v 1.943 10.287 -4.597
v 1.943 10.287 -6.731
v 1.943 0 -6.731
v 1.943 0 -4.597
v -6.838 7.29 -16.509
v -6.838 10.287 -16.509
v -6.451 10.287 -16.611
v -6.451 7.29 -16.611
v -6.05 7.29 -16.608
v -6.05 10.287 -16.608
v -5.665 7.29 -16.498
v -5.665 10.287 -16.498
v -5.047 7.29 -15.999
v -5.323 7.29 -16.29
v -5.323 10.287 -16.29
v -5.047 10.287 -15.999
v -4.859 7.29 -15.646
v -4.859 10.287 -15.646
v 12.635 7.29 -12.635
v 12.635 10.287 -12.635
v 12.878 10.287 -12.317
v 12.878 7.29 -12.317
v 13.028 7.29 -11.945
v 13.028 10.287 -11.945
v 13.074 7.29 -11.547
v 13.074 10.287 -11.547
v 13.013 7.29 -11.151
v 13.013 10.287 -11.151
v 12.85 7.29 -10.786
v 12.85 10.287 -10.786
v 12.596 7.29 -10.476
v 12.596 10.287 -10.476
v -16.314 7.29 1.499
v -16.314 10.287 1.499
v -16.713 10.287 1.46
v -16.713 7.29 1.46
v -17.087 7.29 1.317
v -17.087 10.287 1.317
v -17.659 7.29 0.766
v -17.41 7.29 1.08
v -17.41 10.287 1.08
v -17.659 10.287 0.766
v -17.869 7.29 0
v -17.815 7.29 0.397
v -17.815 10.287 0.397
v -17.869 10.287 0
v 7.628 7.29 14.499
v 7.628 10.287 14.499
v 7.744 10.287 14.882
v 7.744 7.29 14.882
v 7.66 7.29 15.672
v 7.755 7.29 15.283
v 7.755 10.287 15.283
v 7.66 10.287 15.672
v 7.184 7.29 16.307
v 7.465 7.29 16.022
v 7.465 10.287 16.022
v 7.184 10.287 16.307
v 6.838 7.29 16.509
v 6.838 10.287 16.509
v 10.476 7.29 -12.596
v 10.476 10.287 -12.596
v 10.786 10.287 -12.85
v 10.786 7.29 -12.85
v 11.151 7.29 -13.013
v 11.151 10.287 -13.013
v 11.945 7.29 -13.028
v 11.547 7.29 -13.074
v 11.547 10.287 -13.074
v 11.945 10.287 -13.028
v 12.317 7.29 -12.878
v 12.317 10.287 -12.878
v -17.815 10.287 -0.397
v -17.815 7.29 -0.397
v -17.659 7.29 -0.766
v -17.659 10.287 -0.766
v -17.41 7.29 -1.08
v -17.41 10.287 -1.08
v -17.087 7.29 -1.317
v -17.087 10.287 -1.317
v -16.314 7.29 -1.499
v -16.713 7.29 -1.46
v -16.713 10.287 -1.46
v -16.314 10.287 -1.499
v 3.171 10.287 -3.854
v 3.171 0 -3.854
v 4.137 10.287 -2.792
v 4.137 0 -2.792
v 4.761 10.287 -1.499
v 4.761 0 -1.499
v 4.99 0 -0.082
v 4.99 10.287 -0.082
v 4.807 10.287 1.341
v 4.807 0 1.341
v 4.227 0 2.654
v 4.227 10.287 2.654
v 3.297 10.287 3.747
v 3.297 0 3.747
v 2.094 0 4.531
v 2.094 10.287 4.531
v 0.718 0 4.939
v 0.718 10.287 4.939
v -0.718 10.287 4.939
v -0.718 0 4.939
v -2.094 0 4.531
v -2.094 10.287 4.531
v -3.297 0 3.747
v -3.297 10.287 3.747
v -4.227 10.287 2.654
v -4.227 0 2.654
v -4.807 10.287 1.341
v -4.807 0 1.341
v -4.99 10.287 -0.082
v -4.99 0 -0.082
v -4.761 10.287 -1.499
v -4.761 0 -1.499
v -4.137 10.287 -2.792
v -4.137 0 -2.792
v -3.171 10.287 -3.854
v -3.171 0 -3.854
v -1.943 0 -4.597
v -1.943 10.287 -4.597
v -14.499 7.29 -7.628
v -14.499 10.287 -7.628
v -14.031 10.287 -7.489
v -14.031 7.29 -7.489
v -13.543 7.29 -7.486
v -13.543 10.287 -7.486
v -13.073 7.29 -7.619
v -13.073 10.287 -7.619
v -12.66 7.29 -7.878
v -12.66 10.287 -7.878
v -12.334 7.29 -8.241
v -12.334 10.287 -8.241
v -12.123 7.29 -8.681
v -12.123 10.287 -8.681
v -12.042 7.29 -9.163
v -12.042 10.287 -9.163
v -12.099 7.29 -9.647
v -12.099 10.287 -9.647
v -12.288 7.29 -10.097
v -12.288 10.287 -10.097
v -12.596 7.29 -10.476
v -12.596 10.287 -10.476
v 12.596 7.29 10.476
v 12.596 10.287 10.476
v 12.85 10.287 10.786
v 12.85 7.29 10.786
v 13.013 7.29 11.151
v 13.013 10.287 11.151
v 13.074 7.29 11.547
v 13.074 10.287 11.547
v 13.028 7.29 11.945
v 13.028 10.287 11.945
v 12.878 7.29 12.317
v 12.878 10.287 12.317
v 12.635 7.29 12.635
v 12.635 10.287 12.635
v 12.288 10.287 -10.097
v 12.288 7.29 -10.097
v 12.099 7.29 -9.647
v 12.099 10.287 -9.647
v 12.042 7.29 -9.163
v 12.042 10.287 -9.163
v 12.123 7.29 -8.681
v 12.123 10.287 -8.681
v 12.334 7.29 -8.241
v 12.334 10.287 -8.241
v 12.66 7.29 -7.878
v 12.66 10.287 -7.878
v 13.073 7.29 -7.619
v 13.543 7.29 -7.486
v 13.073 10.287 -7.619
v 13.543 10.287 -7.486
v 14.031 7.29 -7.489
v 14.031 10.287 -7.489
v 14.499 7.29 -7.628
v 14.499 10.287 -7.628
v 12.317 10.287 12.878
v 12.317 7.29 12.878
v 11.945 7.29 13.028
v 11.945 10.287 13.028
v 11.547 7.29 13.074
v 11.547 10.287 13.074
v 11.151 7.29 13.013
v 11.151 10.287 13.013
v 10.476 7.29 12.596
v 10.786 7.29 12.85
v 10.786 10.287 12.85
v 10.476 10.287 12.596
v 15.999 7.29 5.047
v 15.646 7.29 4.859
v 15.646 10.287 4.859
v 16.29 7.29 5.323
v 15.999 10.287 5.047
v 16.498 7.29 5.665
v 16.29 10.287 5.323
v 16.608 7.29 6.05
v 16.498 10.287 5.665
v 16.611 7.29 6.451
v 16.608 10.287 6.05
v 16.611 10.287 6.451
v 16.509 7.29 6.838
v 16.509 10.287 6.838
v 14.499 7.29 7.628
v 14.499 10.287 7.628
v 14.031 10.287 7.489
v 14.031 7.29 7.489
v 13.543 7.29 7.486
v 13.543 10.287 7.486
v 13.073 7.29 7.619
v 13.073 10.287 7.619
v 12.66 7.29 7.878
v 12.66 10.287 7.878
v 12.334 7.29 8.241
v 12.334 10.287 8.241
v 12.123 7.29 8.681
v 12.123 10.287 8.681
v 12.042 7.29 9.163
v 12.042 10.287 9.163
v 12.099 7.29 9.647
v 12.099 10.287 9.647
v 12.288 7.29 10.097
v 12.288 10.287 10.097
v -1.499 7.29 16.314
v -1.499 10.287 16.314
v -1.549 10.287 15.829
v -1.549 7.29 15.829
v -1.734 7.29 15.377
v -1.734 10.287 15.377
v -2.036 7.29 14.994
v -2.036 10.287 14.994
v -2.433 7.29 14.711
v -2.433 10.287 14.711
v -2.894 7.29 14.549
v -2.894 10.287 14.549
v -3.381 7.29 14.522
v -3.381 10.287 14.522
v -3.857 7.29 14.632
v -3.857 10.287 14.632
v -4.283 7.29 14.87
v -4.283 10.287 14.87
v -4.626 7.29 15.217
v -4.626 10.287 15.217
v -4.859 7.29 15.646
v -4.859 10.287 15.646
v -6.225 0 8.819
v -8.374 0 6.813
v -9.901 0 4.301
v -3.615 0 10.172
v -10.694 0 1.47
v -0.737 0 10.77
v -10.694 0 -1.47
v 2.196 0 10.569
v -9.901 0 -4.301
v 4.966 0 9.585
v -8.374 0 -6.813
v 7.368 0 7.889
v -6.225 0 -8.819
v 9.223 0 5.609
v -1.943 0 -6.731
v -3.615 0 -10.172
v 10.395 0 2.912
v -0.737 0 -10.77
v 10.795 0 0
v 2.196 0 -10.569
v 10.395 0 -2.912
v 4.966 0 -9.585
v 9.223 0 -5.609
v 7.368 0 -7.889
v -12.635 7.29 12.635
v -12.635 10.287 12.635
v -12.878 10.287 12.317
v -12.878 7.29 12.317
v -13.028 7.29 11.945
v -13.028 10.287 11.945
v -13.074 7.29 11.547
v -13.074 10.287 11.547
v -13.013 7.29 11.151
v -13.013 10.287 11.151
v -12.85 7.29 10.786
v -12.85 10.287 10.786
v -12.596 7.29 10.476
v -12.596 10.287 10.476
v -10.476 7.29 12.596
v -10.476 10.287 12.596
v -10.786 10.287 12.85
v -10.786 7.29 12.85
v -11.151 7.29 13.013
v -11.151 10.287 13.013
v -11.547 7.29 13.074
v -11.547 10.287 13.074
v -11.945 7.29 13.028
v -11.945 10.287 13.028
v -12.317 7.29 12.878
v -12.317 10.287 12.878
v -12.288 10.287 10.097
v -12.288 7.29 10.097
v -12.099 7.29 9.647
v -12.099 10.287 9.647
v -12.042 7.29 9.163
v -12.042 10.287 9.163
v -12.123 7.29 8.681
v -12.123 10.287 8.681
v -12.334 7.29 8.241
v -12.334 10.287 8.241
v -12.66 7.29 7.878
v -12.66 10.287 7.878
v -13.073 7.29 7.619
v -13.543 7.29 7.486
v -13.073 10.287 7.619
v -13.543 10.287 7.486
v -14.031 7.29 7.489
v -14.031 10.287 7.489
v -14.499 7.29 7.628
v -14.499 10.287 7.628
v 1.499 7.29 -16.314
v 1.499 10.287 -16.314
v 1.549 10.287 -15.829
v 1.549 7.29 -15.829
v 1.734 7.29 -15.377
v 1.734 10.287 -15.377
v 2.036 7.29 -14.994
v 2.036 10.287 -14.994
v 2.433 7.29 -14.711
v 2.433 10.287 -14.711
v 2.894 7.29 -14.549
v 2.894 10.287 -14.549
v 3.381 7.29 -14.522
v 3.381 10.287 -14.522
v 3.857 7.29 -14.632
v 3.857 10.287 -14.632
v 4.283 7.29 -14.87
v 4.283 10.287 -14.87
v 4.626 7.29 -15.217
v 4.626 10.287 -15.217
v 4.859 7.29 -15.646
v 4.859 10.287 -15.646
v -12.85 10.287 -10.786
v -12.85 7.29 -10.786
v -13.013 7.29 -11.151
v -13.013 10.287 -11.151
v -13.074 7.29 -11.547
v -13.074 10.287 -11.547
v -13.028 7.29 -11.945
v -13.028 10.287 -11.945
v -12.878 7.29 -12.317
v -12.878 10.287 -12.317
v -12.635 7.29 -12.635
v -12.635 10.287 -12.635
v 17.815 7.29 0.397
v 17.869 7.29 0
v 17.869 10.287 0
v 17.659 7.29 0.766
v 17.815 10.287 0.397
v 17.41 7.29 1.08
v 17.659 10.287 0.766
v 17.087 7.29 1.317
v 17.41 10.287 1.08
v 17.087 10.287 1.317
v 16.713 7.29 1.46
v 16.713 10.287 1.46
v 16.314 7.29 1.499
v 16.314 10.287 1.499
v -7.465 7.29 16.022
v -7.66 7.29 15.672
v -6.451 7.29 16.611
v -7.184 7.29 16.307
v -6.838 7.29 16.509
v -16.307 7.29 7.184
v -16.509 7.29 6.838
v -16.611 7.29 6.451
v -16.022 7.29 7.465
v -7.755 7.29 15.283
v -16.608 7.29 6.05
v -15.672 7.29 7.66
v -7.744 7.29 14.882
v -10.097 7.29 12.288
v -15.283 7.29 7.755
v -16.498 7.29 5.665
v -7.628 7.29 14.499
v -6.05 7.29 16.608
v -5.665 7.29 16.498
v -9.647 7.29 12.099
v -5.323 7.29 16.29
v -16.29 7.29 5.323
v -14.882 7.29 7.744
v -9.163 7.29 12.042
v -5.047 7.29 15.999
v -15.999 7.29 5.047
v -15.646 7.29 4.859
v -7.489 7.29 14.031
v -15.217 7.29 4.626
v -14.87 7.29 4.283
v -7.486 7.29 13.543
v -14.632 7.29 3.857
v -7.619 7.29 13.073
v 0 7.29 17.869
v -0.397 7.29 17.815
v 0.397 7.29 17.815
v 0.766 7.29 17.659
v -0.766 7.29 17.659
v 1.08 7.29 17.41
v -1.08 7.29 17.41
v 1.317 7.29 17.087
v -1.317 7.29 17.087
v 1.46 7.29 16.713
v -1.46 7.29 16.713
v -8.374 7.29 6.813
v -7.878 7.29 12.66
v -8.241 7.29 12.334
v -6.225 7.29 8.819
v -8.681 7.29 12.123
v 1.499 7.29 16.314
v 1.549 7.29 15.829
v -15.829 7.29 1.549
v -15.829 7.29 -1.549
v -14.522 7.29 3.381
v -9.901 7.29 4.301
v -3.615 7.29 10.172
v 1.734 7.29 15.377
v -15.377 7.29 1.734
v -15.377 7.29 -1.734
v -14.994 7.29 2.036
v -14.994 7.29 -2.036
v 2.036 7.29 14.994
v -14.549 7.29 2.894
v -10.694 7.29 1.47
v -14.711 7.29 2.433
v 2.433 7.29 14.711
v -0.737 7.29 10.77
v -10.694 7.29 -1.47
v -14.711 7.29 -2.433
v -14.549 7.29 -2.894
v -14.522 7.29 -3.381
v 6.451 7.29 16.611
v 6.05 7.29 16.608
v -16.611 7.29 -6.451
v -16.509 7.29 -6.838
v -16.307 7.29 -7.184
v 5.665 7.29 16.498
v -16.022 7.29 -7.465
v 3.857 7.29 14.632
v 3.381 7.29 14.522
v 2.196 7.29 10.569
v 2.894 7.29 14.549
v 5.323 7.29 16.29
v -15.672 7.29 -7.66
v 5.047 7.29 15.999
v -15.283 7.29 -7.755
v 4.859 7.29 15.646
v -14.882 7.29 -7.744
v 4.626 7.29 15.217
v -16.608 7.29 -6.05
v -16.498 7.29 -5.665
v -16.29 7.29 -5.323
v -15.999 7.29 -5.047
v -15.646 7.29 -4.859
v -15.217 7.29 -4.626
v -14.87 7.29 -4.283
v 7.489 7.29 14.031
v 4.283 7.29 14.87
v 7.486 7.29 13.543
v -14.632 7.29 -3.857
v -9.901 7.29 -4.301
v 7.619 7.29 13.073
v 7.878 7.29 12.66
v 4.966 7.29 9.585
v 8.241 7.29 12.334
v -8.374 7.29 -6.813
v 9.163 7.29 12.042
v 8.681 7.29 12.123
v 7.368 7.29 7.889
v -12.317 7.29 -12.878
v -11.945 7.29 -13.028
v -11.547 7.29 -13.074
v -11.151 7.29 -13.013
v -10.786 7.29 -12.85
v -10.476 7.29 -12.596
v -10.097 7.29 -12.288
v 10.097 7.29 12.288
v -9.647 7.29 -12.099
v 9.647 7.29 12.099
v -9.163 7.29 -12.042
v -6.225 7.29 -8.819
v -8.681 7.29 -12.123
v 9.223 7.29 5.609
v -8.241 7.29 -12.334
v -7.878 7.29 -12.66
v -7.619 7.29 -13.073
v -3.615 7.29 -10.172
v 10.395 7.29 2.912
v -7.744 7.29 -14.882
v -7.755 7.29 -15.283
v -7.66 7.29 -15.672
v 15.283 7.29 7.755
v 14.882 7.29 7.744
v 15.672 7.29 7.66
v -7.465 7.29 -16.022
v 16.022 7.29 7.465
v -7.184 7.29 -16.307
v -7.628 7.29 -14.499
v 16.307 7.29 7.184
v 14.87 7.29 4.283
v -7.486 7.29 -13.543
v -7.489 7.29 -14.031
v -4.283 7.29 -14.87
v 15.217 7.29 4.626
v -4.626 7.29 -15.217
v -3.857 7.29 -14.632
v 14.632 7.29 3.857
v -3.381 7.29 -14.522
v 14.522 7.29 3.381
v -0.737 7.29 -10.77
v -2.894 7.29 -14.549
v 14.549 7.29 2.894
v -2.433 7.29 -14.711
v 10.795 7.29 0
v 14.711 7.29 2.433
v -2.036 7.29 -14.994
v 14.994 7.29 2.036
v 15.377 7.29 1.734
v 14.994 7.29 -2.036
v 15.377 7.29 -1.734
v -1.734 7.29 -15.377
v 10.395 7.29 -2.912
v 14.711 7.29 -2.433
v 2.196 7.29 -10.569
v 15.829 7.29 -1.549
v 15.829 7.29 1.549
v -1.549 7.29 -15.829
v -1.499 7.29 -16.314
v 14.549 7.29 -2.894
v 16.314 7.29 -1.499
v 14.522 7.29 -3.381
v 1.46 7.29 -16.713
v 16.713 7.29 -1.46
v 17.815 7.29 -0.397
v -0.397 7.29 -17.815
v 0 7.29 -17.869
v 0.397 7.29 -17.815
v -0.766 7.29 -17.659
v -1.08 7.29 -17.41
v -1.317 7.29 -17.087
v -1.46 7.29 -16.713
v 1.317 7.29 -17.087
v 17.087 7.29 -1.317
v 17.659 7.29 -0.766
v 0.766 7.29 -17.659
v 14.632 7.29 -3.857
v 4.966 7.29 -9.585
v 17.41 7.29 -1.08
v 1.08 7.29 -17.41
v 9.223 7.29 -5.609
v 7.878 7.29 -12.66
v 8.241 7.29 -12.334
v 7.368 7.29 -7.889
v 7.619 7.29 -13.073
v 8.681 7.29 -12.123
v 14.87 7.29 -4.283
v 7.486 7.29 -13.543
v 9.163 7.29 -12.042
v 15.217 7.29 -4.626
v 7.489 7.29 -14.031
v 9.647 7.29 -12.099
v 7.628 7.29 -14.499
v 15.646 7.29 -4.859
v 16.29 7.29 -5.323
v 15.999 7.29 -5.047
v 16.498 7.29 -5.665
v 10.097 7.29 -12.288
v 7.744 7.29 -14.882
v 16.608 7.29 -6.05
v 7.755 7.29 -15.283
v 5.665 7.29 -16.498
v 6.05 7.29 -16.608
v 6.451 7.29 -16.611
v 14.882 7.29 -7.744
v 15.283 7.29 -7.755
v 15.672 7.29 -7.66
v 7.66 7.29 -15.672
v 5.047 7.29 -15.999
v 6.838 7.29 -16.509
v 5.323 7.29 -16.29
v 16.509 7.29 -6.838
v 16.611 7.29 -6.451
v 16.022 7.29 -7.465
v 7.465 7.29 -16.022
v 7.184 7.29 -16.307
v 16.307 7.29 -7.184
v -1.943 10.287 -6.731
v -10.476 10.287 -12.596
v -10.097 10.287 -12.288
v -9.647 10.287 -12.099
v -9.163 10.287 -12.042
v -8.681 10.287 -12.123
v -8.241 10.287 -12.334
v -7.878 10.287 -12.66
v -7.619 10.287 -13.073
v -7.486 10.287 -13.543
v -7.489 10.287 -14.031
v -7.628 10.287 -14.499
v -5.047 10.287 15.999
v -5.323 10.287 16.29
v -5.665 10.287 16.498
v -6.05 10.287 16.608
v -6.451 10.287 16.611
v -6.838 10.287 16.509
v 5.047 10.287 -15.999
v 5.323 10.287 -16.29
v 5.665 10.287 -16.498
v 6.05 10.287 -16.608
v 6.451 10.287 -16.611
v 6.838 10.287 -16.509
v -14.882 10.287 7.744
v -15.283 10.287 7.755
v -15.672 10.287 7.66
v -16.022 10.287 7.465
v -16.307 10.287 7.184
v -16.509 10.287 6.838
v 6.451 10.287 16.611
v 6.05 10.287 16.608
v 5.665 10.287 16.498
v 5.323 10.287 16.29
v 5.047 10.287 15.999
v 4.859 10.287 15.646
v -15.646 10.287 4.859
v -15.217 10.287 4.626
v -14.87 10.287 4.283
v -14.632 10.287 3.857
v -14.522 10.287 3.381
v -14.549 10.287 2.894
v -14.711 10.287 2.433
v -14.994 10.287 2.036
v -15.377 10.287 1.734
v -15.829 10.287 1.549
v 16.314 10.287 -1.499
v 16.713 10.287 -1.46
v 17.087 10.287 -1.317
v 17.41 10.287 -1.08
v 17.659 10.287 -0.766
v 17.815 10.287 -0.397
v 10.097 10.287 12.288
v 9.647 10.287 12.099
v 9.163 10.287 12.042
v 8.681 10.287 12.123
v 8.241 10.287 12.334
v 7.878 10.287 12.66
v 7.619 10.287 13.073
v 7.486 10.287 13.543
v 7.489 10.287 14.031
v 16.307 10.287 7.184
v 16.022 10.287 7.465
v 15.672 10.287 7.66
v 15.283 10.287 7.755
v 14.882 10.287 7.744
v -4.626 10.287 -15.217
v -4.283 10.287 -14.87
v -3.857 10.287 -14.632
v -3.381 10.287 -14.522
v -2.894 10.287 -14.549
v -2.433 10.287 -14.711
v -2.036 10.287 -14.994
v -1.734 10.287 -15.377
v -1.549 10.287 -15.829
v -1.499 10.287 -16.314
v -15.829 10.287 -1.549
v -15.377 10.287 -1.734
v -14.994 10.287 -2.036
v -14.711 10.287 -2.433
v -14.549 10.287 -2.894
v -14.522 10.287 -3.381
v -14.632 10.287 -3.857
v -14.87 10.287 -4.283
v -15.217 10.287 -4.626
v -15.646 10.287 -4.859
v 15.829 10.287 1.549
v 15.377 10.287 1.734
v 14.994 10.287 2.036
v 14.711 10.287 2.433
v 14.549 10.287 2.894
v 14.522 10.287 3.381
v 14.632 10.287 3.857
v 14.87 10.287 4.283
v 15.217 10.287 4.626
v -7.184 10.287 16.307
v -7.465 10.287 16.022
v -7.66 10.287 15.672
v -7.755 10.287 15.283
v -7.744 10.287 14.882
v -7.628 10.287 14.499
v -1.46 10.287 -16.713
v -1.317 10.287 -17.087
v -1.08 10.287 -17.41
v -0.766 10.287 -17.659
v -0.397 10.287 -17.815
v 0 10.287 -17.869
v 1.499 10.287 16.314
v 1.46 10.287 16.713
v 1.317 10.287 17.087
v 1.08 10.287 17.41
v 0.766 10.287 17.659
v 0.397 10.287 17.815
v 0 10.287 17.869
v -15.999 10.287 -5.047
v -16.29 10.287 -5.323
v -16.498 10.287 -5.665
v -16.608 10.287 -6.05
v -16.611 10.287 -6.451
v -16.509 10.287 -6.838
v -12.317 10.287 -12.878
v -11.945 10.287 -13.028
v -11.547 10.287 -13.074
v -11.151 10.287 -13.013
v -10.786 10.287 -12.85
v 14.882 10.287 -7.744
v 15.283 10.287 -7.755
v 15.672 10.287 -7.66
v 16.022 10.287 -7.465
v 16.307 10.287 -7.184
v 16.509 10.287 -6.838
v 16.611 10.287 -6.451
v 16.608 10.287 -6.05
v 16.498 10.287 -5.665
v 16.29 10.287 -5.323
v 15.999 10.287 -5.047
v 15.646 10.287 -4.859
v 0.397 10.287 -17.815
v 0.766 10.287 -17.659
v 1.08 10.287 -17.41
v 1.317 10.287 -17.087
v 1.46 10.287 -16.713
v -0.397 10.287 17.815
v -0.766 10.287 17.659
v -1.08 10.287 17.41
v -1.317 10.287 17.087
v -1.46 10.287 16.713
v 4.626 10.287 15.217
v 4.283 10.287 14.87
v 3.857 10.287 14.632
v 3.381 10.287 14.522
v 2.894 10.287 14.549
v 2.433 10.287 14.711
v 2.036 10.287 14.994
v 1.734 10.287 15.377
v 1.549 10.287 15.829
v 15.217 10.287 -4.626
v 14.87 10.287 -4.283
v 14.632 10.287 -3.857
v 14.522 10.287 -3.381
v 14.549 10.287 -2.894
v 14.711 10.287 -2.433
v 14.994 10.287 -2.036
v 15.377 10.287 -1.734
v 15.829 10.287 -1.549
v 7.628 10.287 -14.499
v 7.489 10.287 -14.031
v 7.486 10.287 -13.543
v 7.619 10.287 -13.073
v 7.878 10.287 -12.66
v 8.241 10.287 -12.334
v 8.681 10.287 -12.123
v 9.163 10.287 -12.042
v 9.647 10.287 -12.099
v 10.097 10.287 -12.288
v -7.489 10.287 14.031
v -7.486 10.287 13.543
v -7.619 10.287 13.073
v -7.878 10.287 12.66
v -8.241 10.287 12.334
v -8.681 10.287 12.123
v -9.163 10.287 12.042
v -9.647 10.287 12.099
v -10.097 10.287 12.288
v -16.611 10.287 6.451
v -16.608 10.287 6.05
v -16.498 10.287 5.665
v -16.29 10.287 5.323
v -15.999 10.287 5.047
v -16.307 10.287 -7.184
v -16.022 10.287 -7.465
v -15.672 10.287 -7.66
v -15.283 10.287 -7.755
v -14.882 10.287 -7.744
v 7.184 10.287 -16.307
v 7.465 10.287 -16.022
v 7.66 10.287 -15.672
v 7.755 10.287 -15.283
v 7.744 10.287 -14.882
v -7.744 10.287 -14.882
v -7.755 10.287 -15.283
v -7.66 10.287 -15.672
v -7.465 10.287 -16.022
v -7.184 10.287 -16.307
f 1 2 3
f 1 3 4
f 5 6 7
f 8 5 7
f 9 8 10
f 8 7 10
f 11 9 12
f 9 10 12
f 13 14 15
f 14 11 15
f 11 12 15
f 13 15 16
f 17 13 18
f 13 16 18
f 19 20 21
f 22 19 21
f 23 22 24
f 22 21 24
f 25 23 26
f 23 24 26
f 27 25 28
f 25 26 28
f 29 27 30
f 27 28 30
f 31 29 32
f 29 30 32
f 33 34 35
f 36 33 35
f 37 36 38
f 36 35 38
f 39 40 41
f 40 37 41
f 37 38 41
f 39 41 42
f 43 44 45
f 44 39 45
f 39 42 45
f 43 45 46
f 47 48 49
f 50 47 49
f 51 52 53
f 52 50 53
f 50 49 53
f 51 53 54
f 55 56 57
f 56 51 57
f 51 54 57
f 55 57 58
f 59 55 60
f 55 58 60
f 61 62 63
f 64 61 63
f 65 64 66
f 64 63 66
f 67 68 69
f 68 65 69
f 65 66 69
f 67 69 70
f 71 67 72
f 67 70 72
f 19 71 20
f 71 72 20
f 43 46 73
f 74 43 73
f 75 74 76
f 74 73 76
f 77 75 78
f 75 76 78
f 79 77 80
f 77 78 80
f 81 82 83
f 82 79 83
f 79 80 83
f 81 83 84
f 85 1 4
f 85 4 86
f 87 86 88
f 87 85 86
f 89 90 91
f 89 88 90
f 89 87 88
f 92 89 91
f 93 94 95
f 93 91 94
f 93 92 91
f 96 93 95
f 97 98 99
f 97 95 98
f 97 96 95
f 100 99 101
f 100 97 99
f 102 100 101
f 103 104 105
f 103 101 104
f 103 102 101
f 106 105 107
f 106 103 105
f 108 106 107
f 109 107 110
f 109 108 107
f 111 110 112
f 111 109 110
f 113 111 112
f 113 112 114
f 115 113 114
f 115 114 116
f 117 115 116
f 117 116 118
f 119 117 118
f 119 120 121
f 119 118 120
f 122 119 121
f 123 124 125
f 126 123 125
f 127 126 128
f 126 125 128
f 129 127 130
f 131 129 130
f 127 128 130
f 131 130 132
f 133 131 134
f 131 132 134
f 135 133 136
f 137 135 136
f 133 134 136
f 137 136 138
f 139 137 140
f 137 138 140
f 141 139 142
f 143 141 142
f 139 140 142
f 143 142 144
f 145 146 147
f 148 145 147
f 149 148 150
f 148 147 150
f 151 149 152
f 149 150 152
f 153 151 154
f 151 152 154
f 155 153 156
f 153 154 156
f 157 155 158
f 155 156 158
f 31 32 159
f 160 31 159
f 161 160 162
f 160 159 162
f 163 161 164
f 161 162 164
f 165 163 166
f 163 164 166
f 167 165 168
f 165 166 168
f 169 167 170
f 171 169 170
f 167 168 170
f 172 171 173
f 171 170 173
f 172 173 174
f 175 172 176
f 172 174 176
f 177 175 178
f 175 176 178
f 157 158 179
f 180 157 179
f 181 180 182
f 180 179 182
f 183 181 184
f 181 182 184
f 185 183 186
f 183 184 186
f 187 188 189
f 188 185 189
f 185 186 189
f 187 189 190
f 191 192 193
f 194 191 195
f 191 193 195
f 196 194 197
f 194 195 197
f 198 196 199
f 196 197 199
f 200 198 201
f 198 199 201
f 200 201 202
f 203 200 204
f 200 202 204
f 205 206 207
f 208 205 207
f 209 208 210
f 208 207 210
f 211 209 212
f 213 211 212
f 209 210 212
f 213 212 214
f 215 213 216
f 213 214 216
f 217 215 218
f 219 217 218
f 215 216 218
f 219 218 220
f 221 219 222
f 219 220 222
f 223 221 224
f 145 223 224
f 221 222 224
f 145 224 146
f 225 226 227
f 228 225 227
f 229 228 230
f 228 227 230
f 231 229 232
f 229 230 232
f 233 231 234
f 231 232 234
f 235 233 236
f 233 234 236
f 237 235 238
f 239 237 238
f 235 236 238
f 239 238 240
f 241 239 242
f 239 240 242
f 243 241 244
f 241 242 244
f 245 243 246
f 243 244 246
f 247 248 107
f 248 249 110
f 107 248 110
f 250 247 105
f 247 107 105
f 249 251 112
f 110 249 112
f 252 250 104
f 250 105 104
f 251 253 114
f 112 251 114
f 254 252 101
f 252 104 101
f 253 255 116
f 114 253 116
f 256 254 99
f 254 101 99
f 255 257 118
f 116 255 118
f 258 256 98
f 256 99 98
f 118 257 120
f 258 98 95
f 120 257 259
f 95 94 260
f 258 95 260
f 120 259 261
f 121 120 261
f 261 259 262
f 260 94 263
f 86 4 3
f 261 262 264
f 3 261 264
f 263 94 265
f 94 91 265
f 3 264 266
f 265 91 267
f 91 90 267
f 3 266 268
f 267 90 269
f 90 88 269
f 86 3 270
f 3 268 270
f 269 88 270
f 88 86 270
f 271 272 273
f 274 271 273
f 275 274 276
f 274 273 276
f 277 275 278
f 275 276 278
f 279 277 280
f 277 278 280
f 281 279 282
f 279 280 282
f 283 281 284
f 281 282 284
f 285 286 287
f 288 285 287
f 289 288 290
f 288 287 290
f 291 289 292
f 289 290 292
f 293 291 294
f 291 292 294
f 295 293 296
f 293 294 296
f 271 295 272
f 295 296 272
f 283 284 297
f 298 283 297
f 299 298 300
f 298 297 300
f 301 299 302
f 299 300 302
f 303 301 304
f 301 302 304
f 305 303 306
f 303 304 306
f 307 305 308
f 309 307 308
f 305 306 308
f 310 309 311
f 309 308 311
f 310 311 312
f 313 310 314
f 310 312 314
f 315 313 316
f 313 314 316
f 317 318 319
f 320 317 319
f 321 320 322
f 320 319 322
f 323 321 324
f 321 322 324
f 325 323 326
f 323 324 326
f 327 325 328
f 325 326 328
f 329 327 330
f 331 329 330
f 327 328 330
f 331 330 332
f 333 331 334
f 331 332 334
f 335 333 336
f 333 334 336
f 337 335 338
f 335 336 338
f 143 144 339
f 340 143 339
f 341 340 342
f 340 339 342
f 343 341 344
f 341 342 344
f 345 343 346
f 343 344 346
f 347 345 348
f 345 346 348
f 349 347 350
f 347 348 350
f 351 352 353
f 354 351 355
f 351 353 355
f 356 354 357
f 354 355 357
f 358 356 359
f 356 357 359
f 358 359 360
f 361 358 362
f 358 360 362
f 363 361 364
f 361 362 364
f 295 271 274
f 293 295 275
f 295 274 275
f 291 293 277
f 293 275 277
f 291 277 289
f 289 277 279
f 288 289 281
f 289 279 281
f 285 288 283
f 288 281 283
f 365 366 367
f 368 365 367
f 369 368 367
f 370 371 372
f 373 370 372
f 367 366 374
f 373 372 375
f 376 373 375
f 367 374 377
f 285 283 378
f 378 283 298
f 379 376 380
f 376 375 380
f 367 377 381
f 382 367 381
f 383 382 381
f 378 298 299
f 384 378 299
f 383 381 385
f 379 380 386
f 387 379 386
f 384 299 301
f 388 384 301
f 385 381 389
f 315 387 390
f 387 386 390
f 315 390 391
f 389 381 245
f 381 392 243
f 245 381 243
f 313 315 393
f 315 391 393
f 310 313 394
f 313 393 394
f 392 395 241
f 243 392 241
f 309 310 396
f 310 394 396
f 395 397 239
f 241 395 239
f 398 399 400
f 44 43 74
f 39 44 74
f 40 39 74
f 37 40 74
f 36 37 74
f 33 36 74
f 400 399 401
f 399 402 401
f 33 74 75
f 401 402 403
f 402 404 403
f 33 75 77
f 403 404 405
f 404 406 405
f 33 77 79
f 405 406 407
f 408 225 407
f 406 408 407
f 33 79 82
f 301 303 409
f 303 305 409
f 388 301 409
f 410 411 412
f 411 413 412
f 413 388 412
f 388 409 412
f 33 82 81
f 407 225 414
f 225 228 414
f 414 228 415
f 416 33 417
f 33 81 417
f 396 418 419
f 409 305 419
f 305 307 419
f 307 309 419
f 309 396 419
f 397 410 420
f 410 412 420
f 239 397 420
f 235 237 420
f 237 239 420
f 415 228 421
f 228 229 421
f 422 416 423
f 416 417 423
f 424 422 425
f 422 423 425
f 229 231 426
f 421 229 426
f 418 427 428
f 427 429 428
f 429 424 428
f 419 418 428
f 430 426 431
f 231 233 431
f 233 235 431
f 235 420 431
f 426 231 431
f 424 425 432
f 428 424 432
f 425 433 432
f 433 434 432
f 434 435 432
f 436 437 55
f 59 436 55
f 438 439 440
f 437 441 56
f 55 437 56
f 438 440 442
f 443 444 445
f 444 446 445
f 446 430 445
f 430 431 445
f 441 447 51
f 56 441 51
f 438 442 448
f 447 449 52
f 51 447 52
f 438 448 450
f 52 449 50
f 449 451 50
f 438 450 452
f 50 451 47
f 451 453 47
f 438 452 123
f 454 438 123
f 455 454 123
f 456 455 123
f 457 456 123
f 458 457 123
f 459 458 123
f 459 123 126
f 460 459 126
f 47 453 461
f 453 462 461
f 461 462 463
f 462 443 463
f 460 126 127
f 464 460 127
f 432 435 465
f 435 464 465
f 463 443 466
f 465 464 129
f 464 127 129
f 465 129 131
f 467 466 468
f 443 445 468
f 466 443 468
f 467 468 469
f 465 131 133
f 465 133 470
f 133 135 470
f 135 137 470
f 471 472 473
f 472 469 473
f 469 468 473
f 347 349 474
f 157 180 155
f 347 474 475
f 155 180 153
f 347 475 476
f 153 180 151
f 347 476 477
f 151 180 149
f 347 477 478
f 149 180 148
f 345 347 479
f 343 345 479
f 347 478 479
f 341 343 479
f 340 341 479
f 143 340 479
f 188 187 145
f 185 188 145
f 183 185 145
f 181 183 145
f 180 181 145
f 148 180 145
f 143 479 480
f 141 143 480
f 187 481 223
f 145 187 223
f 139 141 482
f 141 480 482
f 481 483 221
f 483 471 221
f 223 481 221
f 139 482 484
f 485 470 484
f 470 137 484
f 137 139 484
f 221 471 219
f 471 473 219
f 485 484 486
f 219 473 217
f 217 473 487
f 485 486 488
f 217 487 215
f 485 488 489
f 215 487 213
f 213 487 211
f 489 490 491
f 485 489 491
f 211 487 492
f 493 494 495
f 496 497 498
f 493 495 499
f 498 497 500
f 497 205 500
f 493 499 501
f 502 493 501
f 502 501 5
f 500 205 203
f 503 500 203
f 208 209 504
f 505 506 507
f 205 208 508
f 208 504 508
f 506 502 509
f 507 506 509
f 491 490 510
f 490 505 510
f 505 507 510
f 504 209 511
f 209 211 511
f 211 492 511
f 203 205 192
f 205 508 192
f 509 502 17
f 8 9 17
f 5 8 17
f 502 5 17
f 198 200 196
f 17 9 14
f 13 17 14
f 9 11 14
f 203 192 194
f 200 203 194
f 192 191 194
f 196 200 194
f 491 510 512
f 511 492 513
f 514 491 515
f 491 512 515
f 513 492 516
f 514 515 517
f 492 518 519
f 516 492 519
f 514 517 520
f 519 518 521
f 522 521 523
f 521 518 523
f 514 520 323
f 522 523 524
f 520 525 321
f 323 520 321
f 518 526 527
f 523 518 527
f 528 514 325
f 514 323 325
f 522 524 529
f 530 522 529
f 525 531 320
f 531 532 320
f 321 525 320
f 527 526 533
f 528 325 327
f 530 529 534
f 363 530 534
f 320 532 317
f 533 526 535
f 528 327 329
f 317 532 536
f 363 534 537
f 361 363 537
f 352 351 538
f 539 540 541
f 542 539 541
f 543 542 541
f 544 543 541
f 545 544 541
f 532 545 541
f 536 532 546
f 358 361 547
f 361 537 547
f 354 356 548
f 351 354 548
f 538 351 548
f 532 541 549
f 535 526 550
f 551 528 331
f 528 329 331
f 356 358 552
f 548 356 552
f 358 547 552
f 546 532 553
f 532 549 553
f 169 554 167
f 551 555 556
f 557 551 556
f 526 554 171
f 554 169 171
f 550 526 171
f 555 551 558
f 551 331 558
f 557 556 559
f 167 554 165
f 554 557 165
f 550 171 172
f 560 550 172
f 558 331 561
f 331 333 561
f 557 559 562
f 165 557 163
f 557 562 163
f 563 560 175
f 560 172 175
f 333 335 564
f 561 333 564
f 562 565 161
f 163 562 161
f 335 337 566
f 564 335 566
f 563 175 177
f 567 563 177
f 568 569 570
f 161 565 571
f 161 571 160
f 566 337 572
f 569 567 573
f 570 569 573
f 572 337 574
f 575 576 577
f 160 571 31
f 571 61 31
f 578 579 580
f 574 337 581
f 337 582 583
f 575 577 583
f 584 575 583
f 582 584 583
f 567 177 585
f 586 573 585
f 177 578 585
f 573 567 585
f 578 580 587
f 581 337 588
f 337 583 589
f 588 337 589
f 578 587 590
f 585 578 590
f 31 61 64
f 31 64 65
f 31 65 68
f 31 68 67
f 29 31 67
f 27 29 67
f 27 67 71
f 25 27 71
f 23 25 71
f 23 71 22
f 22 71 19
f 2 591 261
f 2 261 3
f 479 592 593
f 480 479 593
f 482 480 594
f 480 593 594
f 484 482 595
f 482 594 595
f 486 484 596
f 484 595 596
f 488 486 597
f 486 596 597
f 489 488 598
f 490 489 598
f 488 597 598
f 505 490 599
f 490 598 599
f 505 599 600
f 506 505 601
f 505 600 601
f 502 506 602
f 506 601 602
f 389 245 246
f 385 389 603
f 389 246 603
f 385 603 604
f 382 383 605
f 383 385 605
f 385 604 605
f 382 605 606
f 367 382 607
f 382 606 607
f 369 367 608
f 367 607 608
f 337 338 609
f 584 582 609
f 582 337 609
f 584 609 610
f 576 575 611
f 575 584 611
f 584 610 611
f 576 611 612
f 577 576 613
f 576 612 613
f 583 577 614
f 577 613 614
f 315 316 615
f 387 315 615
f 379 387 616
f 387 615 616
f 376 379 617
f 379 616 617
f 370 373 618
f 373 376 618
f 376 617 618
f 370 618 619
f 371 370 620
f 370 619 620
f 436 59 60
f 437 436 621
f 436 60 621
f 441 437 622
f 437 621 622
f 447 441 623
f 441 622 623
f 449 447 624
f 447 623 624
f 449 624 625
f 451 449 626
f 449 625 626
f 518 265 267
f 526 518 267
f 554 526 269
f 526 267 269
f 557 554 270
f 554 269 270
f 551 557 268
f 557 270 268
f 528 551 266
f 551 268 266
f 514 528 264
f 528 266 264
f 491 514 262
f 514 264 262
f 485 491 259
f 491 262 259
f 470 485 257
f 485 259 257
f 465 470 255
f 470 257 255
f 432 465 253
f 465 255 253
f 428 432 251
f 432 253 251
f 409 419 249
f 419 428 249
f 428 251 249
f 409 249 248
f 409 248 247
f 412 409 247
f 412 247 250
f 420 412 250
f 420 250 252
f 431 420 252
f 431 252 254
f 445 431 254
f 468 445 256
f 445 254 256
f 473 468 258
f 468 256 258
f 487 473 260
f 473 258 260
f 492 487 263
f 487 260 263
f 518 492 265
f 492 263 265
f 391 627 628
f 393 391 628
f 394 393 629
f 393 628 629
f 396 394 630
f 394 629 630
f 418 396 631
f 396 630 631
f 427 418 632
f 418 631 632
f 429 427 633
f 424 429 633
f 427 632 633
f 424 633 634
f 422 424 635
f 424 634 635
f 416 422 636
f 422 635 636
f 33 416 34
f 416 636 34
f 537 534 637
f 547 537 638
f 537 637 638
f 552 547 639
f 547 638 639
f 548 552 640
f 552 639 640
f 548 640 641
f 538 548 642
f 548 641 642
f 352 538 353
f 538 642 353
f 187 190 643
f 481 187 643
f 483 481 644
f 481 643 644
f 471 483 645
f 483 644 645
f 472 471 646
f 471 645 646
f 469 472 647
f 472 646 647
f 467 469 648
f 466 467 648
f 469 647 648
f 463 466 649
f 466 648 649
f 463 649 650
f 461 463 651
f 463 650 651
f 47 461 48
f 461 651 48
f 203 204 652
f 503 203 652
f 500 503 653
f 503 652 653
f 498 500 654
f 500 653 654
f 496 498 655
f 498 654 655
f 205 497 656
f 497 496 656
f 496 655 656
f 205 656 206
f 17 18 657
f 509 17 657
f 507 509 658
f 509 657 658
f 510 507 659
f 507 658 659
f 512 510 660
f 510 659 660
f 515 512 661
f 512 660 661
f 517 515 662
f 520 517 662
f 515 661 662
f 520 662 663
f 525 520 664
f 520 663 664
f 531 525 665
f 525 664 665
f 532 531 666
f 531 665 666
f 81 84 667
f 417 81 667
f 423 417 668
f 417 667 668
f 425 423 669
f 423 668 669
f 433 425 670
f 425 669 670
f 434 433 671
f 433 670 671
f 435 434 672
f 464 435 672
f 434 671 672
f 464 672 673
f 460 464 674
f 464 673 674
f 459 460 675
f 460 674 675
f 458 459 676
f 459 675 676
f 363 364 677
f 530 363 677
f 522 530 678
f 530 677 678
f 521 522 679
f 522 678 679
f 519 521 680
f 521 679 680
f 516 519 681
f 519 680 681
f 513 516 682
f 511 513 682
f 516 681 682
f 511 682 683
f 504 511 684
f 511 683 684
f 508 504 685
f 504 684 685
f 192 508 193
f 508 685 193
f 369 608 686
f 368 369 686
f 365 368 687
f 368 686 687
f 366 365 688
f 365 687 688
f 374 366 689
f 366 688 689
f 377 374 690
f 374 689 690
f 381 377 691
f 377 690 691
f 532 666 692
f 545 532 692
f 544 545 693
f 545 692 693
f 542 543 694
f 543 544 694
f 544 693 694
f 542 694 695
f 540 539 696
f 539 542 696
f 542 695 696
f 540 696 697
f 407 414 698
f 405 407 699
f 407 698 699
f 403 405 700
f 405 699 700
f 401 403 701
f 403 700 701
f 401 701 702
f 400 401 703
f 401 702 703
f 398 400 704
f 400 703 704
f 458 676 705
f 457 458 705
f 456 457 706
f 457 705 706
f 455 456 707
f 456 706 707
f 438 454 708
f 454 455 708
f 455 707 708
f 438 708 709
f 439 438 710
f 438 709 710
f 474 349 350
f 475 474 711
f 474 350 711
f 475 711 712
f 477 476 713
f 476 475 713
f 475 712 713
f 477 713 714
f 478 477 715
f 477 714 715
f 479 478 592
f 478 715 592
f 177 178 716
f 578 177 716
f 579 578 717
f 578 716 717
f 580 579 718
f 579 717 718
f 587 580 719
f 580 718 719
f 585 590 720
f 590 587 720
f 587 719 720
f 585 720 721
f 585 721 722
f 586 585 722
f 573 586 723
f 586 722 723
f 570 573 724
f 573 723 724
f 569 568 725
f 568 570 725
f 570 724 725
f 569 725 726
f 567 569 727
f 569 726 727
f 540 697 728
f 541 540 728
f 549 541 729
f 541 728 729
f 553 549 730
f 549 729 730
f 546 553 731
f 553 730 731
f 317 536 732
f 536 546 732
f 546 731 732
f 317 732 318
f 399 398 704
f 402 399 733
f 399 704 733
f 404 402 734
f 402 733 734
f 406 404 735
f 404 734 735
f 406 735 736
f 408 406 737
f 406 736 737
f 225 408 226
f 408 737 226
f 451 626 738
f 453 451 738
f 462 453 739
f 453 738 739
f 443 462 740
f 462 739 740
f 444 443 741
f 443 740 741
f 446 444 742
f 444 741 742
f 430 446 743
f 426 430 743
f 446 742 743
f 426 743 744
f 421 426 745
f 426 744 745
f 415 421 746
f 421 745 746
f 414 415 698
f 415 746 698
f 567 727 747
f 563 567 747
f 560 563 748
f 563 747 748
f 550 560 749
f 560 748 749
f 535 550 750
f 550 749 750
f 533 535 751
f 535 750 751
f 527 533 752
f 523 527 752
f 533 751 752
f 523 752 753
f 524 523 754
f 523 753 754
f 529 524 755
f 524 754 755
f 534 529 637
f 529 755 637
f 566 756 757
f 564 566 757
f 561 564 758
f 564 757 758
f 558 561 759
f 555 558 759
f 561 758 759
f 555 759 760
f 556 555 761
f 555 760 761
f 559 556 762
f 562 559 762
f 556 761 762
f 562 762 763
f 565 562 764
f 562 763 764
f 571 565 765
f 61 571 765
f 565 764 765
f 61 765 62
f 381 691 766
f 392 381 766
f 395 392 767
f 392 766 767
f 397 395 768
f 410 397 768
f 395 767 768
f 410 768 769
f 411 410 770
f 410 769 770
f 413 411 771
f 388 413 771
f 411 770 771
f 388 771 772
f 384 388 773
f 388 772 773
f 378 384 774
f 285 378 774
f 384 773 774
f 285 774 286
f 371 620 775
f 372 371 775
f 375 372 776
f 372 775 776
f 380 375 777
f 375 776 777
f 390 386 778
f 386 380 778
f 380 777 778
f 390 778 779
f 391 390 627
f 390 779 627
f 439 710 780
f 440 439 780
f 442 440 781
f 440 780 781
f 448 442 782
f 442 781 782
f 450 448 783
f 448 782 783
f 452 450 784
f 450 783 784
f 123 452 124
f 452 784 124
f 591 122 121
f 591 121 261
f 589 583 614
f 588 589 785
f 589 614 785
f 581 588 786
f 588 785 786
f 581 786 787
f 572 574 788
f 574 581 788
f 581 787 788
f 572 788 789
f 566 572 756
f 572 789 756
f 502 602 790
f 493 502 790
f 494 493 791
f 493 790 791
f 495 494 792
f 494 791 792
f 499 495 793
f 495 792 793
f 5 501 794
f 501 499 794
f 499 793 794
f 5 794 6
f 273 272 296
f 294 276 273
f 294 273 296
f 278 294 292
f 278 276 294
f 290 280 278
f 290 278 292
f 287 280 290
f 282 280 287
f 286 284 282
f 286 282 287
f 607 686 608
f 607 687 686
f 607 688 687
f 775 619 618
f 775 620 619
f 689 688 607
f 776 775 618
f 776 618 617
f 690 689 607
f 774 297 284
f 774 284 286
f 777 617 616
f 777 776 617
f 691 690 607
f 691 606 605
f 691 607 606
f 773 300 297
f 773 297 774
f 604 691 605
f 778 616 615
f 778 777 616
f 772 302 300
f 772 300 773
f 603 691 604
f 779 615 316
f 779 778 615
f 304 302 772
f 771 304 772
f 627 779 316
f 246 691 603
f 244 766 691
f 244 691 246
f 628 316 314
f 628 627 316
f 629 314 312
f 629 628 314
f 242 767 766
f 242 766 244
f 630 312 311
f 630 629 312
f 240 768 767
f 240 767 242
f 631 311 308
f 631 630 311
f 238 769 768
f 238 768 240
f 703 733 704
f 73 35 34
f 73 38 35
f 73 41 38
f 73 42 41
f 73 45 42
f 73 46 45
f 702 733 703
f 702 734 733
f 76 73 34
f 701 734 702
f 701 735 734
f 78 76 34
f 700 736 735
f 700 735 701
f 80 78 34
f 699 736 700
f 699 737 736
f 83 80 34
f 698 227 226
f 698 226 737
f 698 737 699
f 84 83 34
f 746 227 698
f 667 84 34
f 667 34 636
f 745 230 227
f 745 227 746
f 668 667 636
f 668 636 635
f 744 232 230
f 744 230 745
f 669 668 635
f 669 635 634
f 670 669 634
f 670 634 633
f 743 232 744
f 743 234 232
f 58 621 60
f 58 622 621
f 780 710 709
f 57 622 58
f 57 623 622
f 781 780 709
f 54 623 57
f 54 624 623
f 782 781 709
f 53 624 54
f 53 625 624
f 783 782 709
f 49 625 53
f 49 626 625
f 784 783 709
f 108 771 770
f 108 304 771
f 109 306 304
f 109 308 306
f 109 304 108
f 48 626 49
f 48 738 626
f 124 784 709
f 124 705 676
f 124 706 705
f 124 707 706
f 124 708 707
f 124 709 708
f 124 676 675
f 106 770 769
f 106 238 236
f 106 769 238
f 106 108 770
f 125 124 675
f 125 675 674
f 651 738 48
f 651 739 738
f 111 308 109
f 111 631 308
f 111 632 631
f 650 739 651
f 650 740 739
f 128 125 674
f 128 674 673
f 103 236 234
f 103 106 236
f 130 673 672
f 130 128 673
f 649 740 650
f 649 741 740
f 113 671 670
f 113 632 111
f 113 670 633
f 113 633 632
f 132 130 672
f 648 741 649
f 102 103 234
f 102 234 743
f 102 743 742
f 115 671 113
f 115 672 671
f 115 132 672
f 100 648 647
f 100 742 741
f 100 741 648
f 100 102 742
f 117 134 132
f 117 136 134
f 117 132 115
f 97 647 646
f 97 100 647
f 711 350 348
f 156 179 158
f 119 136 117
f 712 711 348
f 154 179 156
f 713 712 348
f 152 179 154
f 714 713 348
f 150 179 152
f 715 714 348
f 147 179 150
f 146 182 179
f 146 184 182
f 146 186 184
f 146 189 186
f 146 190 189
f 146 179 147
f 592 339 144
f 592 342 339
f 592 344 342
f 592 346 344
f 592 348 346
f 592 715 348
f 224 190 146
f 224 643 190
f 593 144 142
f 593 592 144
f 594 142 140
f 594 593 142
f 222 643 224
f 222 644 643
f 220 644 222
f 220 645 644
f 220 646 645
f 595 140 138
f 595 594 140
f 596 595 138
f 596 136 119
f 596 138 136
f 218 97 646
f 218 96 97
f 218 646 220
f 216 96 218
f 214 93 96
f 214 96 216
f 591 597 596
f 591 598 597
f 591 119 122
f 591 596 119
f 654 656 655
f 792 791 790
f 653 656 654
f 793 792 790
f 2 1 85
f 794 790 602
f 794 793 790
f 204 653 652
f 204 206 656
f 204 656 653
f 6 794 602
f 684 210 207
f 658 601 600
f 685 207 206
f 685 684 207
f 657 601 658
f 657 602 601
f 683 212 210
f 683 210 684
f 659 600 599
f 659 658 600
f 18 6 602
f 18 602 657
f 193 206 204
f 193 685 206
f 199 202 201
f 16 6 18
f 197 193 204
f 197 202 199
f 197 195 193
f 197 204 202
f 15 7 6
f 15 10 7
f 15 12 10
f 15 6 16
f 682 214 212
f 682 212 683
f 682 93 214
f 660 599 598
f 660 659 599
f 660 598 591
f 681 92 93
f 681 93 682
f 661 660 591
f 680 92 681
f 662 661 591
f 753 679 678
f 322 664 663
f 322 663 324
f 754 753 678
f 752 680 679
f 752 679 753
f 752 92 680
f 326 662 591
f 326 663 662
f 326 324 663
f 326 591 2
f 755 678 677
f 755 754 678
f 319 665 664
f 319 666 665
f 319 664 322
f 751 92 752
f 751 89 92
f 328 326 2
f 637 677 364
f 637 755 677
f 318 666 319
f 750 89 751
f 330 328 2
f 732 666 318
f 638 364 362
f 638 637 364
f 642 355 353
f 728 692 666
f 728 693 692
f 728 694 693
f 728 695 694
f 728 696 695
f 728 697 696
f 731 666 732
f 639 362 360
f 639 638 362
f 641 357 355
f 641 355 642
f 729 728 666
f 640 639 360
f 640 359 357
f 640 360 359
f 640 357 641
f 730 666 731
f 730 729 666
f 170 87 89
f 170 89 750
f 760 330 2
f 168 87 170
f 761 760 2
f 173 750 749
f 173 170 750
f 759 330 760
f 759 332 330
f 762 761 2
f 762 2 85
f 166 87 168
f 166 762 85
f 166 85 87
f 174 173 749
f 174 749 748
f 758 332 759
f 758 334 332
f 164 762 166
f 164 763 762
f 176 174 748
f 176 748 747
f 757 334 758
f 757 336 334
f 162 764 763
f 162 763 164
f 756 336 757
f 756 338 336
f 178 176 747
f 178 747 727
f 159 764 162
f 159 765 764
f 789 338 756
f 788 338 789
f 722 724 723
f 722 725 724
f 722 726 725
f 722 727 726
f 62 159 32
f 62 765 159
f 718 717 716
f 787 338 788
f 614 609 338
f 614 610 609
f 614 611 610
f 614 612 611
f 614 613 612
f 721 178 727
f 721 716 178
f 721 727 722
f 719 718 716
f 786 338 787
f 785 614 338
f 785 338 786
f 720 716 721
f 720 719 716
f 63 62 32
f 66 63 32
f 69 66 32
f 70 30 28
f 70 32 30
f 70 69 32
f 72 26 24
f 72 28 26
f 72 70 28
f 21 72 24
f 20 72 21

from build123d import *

# Parameters (mm, degrees)
SKETCH2_R           = 10.795
BOSS_EXTRUDE1_DEPTH = 10.287
SKETCH3_R           = 17.8689
BOSS_EXTRUDE2_DEPTH = 2.9972
CUT_EXTRUDE1_DEPTH  = 11.287
CUT_EXTRUDE2_DEPTH  = 11.287


with BuildPart() as part:
    # Sketch2 → Boss-Extrude1 (new body)
    with BuildSketch(Plane(origin=(0, 0, 0), x_dir=(1, 0, 0), z_dir=(0, 1, 0))):
        Circle(SKETCH2_R)
    extrude(amount=BOSS_EXTRUDE1_DEPTH)

    # Sketch3 → Boss-Extrude2 (add)
    with BuildSketch(Plane(origin=(0, 10.287, 0), x_dir=(1, 0, 0), z_dir=(0, 1, 0))):
        Circle(SKETCH3_R)
    extrude(amount=-BOSS_EXTRUDE2_DEPTH)

    # Sketch4 → Cut-Extrude1 (cut, through all)
    with BuildSketch(Plane(origin=(0, 10.287, 0), x_dir=(1, 0, 0), z_dir=(0, 1, 0))):
        with BuildLine():
            ThreePointArc((1.4e-08, 17.8689), (1.079645228, 17.410056336), (1.4986, 16.314315402))
            ThreePointArc((1.4986, 16.314315402), (3.196164746, 16.068205249), (4.858692347, 15.645951479))
            ThreePointArc((4.858692347, 15.645951479), (5.665077892, 16.497957009), (6.838131777, 16.508711064))
            ThreePointArc((6.838131777, 16.508711064), (3.486049352, 17.525554117), (1.4e-08, 17.8689))
        make_face()
        with BuildLine():
            ThreePointArc((4.858692347, 15.645951479), (3.196164746, 16.068205249), (1.4986, 16.314315402))
            ThreePointArc((1.4986, 16.314315402), (2.893978636, 14.549013087), (4.858692347, 15.645951479))
        make_face()
        with BuildLine():
            ThreePointArc((12.63522035, 12.635220375), (9.927428836, 14.857447422), (6.838131777, 16.508711064))
            ThreePointArc((6.838131777, 16.508711064), (7.660002201, 15.671632478), (7.627744082, 14.498972695))
            ThreePointArc((7.627744082, 14.498972695), (9.101907128, 13.621966658), (10.476292829, 12.595633274))
            ThreePointArc((10.476292829, 12.595633274), (11.547344433, 13.074193358), (12.63522035, 12.635220375))
        make_face()
        with BuildLine():
            ThreePointArc((10.476292829, 12.595633274), (9.101907128, 13.621966658), (7.627744082, 14.498972695))
            ThreePointArc((7.627744082, 14.498972695), (8.241353895, 12.334057732), (10.476292829, 12.595633274))
        make_face()
        with BuildLine():
            ThreePointArc((16.508710924, 6.838132115), (14.857447311, 9.927429003), (12.63522035, 12.635220375))
            ThreePointArc((12.63522035, 12.635220375), (13.074193359, 11.54734445), (12.595633274, 10.476292829))
            ThreePointArc((12.595633274, 10.476292829), (13.621966658, 9.101907128), (14.498972695, 7.627744082))
            ThreePointArc((14.498972695, 7.627744082), (15.671632308, 7.660002268), (16.508710924, 6.838132115))
        make_face()
        with BuildLine():
            ThreePointArc((14.498972695, 7.627744082), (13.621966658, 9.101907128), (12.595633274, 10.476292829))
            ThreePointArc((12.595633274, 10.476292829), (12.334057732, 8.241353895), (14.498972695, 7.627744082))
        make_face()
        with BuildLine():
            ThreePointArc((17.8689, 0), (17.525554083, 3.486049525), (16.508710924, 6.838132115))
            ThreePointArc((16.508710924, 6.838132115), (16.497957082, 5.665078059), (15.645951479, 4.858692347))
            ThreePointArc((15.645951479, 4.858692347), (16.068205249, 3.196164746), (16.314315402, 1.4986))
            ThreePointArc((16.314315402, 1.4986), (17.410056341, 1.079645223), (17.8689, 0))
        make_face()
        with BuildLine():
            ThreePointArc((16.314315402, 1.4986), (16.068205249, 3.196164746), (15.645951479, 4.858692347))
            ThreePointArc((15.645951479, 4.858692347), (14.549013087, 2.893978636), (16.314315402, 1.4986))
        make_face()
        with BuildLine():
            ThreePointArc((16.508710924, -6.838132115), (17.525554083, -3.486049525), (17.8689, 0))
            ThreePointArc((17.8689, 0), (17.410056341, -1.079645223), (16.314315402, -1.4986))
            ThreePointArc((16.314315402, -1.4986), (16.068205249, -3.196164746), (15.645951479, -4.858692347))
            ThreePointArc((15.645951479, -4.858692347), (16.497957082, -5.665078059), (16.508710924, -6.838132115))
        make_face()
        with BuildLine():
            ThreePointArc((15.645951479, -4.858692347), (16.068205249, -3.196164746), (16.314315402, -1.4986))
            ThreePointArc((16.314315402, -1.4986), (14.549013087, -2.893978636), (15.645951479, -4.858692347))
        make_face()
        with BuildLine():
            ThreePointArc((12.635220358, -12.635220367), (14.857447314, -9.927428998), (16.508710924, -6.838132115))
            ThreePointArc((16.508710924, -6.838132115), (15.671632308, -7.660002268), (14.498972695, -7.627744082))
            ThreePointArc((14.498972695, -7.627744082), (13.621966658, -9.101907128), (12.595633274, -10.476292829))
            ThreePointArc((12.595633274, -10.476292829), (13.074193359, -11.547344445), (12.635220358, -12.635220367))
        make_face()
        with BuildLine():
            ThreePointArc((12.595633274, -10.476292829), (13.621966658, -9.101907128), (14.498972695, -7.627744082))
            ThreePointArc((14.498972695, -7.627744082), (12.334057732, -8.241353895), (12.595633274, -10.476292829))
        make_face()
        with BuildLine():
            ThreePointArc((6.838132083, -16.508710938), (9.927428978, -14.857447327), (12.635220358, -12.635220367))
            ThreePointArc((12.635220358, -12.635220367), (11.547344438, -13.074193358), (10.476292829, -12.595633274))
            ThreePointArc((10.476292829, -12.595633274), (9.101907128, -13.621966658), (7.627744082, -14.498972695))
            ThreePointArc((7.627744082, -14.498972695), (7.660002262, -15.671632324), (6.838132083, -16.508710938))
        make_face()
        with BuildLine():
            ThreePointArc((7.627744082, -14.498972695), (9.101907128, -13.621966658), (10.476292829, -12.595633274))
            ThreePointArc((10.476292829, -12.595633274), (8.241353895, -12.334057732), (7.627744082, -14.498972695))
        make_face()
        with BuildLine():
            ThreePointArc((0, -17.8689), (3.486049507, -17.525554087), (6.838132083, -16.508710938))
            ThreePointArc((6.838132083, -16.508710938), (5.665078043, -16.497957075), (4.858692347, -15.645951479))
            ThreePointArc((4.858692347, -15.645951479), (3.196164746, -16.068205249), (1.4986, -16.314315402))
            ThreePointArc((1.4986, -16.314315402), (1.079645223, -17.410056341), (0, -17.8689))
        make_face()
        with BuildLine():
            ThreePointArc((1.4986, -16.314315402), (3.196164746, -16.068205249), (4.858692347, -15.645951479))
            ThreePointArc((4.858692347, -15.645951479), (2.893978636, -14.549013087), (1.4986, -16.314315402))
        make_face()
        with BuildLine():
            ThreePointArc((-4.858692347, -15.645951479), (-5.665078063, -16.497957083), (-6.838132123, -16.508710921))
            ThreePointArc((-6.838132123, -16.508710921), (-3.486049529, -17.525554082), (0, -17.8689))
            ThreePointArc((0, -17.8689), (-1.079645223, -17.410056341), (-1.4986, -16.314315402))
            ThreePointArc((-1.4986, -16.314315402), (-3.196164746, -16.068205249), (-4.858692347, -15.645951479))
        make_face()
        with BuildLine():
            ThreePointArc((-1.4986, -16.314315402), (-2.893978636, -14.549013087), (-4.858692347, -15.645951479))
            ThreePointArc((-4.858692347, -15.645951479), (-3.196164746, -16.068205249), (-1.4986, -16.314315402))
        make_face()
        with BuildLine():
            ThreePointArc((-7.627744082, -14.498972695), (-8.241353895, -12.334057732), (-10.476292829, -12.595633274))
            ThreePointArc((-10.476292829, -12.595633274), (-9.101907128, -13.621966658), (-7.627744082, -14.498972695))
        make_face()
        with BuildLine():
            ThreePointArc((-14.498972695, -7.627744082), (-15.671632446, -7.660002214), (-16.508711038, -6.838131842))
            ThreePointArc((-16.508711038, -6.838131842), (-14.857447398, -9.927428873), (-12.635220362, -12.635220362))
            ThreePointArc((-12.635220362, -12.635220362), (-13.074193358, -11.547344441), (-12.595633274, -10.476292829))
            ThreePointArc((-12.595633274, -10.476292829), (-13.621966658, -9.101907128), (-14.498972695, -7.627744082))
        make_face()
        with BuildLine():
            ThreePointArc((-12.595633274, -10.476292829), (-12.334057732, -8.241353895), (-14.498972695, -7.627744082))
            ThreePointArc((-14.498972695, -7.627744082), (-13.621966658, -9.101907128), (-12.595633274, -10.476292829))
        make_face()
        with BuildLine():
            ThreePointArc((-16.314315402, -1.4986), (-17.410056347, -1.079645218), (-17.8689, 1.4e-08))
            ThreePointArc((-17.8689, 1.4e-08), (-17.525554113, -3.486049372), (-16.508711038, -6.838131842))
            ThreePointArc((-16.508711038, -6.838131842), (-16.497957023, -5.665077924), (-15.645951479, -4.858692347))
            ThreePointArc((-15.645951479, -4.858692347), (-16.068205249, -3.196164746), (-16.314315402, -1.4986))
        make_face()
        with BuildLine():
            ThreePointArc((-15.645951479, -4.858692347), (-14.549013087, -2.893978636), (-16.314315402, -1.4986))
            ThreePointArc((-16.314315402, -1.4986), (-16.068205249, -3.196164746), (-15.645951479, -4.858692347))
        make_face()
        with BuildLine():
            ThreePointArc((-15.645951479, 4.858692347), (-16.497957093, 5.665078085), (-16.508710903, 6.838132168))
            ThreePointArc((-16.508710903, 6.838132168), (-17.525554076, 3.486049559), (-17.8689, 1.4e-08))
            ThreePointArc((-17.8689, 1.4e-08), (-17.410056336, 1.079645228), (-16.314315402, 1.4986))
            ThreePointArc((-16.314315402, 1.4986), (-16.068205249, 3.196164746), (-15.645951479, 4.858692347))
        make_face()
        with BuildLine():
            ThreePointArc((-16.314315402, 1.4986), (-14.549013087, 2.893978636), (-15.645951479, 4.858692347))
            ThreePointArc((-15.645951479, 4.858692347), (-16.068205249, 3.196164746), (-16.314315402, 1.4986))
        make_face()
        with BuildLine():
            ThreePointArc((-12.595633274, 10.476292829), (-13.074193358, 11.547344436), (-12.63522037, 12.635220355))
            ThreePointArc((-12.63522037, 12.635220355), (-14.857447303, 9.927429015), (-16.508710903, 6.838132168))
            ThreePointArc((-16.508710903, 6.838132168), (-15.671632282, 7.660002279), (-14.498972695, 7.627744082))
            ThreePointArc((-14.498972695, 7.627744082), (-13.621966658, 9.101907128), (-12.595633274, 10.476292829))
        make_face()
        with BuildLine():
            ThreePointArc((-14.498972695, 7.627744082), (-12.334057732, 8.241353895), (-12.595633274, 10.476292829))
            ThreePointArc((-12.595633274, 10.476292829), (-13.621966658, 9.101907128), (-14.498972695, 7.627744082))
        make_face()
        with BuildLine():
            ThreePointArc((-7.627744082, 14.498972695), (-7.660002268, 15.671632308), (-6.838132115, 16.508710924))
            ThreePointArc((-6.838132115, 16.508710924), (-9.927429, 14.857447313), (-12.63522037, 12.635220355))
            ThreePointArc((-12.63522037, 12.635220355), (-11.547344447, 13.074193359), (-10.476292829, 12.595633274))
            ThreePointArc((-10.476292829, 12.595633274), (-9.101907128, 13.621966658), (-7.627744082, 14.498972695))
        make_face()
        with BuildLine():
            ThreePointArc((-10.476292829, 12.595633274), (-8.241353895, 12.334057732), (-7.627744082, 14.498972695))
            ThreePointArc((-7.627744082, 14.498972695), (-9.101907128, 13.621966658), (-10.476292829, 12.595633274))
        make_face()
        with BuildLine():
            ThreePointArc((-4.858692347, 15.645951479), (-2.893978636, 14.549013087), (-1.4986, 16.314315402))
            ThreePointArc((-1.4986, 16.314315402), (-3.196164746, 16.068205249), (-4.858692347, 15.645951479))
        make_face()
        with BuildLine():
            ThreePointArc((-1.4986, 16.314315402), (-1.079645218, 17.410056347), (1.4e-08, 17.8689))
            ThreePointArc((1.4e-08, 17.8689), (-3.486049518, 17.525554085), (-6.838132115, 16.508710924))
            ThreePointArc((-6.838132115, 16.508710924), (-5.665078059, 16.497957082), (-4.858692347, 15.645951479))
            ThreePointArc((-4.858692347, 15.645951479), (-3.196164746, 16.068205249), (-1.4986, 16.314315402))
        make_face()
        with BuildLine():
            ThreePointArc((-10.476292829, -12.595633274), (-11.547344441, -13.074193358), (-12.635220362, -12.635220362))
            ThreePointArc((-12.635220362, -12.635220362), (-9.927428999, -14.857447314), (-6.838132123, -16.508710921))
            ThreePointArc((-6.838132123, -16.508710921), (-7.66000227, -15.671632304), (-7.627744082, -14.498972695))
            ThreePointArc((-7.627744082, -14.498972695), (-9.101907128, -13.621966658), (-10.476292829, -12.595633274))
        make_face()
    extrude(amount=-CUT_EXTRUDE1_DEPTH, mode=Mode.SUBTRACT)

    # Sketch5 → Cut-Extrude2 (cut, through all)
    with BuildSketch(Plane(origin=(0, 10.287, 0), x_dir=(1, 0, 0), z_dir=(0, 1, 0))):
        with BuildLine():
            Line((-1.9431, 4.597329834), (-1.9431, 6.731))
            Line((-1.9431, 6.731), (1.9431, 6.731))
            Line((1.9431, 6.731), (1.9431, 4.597329834))
            ThreePointArc((1.9431, 4.597329834), (0, -4.9911), (-1.9431, 4.597329834))
        make_face()
    extrude(amount=-CUT_EXTRUDE2_DEPTH, mode=Mode.SUBTRACT)


solid = part.part
